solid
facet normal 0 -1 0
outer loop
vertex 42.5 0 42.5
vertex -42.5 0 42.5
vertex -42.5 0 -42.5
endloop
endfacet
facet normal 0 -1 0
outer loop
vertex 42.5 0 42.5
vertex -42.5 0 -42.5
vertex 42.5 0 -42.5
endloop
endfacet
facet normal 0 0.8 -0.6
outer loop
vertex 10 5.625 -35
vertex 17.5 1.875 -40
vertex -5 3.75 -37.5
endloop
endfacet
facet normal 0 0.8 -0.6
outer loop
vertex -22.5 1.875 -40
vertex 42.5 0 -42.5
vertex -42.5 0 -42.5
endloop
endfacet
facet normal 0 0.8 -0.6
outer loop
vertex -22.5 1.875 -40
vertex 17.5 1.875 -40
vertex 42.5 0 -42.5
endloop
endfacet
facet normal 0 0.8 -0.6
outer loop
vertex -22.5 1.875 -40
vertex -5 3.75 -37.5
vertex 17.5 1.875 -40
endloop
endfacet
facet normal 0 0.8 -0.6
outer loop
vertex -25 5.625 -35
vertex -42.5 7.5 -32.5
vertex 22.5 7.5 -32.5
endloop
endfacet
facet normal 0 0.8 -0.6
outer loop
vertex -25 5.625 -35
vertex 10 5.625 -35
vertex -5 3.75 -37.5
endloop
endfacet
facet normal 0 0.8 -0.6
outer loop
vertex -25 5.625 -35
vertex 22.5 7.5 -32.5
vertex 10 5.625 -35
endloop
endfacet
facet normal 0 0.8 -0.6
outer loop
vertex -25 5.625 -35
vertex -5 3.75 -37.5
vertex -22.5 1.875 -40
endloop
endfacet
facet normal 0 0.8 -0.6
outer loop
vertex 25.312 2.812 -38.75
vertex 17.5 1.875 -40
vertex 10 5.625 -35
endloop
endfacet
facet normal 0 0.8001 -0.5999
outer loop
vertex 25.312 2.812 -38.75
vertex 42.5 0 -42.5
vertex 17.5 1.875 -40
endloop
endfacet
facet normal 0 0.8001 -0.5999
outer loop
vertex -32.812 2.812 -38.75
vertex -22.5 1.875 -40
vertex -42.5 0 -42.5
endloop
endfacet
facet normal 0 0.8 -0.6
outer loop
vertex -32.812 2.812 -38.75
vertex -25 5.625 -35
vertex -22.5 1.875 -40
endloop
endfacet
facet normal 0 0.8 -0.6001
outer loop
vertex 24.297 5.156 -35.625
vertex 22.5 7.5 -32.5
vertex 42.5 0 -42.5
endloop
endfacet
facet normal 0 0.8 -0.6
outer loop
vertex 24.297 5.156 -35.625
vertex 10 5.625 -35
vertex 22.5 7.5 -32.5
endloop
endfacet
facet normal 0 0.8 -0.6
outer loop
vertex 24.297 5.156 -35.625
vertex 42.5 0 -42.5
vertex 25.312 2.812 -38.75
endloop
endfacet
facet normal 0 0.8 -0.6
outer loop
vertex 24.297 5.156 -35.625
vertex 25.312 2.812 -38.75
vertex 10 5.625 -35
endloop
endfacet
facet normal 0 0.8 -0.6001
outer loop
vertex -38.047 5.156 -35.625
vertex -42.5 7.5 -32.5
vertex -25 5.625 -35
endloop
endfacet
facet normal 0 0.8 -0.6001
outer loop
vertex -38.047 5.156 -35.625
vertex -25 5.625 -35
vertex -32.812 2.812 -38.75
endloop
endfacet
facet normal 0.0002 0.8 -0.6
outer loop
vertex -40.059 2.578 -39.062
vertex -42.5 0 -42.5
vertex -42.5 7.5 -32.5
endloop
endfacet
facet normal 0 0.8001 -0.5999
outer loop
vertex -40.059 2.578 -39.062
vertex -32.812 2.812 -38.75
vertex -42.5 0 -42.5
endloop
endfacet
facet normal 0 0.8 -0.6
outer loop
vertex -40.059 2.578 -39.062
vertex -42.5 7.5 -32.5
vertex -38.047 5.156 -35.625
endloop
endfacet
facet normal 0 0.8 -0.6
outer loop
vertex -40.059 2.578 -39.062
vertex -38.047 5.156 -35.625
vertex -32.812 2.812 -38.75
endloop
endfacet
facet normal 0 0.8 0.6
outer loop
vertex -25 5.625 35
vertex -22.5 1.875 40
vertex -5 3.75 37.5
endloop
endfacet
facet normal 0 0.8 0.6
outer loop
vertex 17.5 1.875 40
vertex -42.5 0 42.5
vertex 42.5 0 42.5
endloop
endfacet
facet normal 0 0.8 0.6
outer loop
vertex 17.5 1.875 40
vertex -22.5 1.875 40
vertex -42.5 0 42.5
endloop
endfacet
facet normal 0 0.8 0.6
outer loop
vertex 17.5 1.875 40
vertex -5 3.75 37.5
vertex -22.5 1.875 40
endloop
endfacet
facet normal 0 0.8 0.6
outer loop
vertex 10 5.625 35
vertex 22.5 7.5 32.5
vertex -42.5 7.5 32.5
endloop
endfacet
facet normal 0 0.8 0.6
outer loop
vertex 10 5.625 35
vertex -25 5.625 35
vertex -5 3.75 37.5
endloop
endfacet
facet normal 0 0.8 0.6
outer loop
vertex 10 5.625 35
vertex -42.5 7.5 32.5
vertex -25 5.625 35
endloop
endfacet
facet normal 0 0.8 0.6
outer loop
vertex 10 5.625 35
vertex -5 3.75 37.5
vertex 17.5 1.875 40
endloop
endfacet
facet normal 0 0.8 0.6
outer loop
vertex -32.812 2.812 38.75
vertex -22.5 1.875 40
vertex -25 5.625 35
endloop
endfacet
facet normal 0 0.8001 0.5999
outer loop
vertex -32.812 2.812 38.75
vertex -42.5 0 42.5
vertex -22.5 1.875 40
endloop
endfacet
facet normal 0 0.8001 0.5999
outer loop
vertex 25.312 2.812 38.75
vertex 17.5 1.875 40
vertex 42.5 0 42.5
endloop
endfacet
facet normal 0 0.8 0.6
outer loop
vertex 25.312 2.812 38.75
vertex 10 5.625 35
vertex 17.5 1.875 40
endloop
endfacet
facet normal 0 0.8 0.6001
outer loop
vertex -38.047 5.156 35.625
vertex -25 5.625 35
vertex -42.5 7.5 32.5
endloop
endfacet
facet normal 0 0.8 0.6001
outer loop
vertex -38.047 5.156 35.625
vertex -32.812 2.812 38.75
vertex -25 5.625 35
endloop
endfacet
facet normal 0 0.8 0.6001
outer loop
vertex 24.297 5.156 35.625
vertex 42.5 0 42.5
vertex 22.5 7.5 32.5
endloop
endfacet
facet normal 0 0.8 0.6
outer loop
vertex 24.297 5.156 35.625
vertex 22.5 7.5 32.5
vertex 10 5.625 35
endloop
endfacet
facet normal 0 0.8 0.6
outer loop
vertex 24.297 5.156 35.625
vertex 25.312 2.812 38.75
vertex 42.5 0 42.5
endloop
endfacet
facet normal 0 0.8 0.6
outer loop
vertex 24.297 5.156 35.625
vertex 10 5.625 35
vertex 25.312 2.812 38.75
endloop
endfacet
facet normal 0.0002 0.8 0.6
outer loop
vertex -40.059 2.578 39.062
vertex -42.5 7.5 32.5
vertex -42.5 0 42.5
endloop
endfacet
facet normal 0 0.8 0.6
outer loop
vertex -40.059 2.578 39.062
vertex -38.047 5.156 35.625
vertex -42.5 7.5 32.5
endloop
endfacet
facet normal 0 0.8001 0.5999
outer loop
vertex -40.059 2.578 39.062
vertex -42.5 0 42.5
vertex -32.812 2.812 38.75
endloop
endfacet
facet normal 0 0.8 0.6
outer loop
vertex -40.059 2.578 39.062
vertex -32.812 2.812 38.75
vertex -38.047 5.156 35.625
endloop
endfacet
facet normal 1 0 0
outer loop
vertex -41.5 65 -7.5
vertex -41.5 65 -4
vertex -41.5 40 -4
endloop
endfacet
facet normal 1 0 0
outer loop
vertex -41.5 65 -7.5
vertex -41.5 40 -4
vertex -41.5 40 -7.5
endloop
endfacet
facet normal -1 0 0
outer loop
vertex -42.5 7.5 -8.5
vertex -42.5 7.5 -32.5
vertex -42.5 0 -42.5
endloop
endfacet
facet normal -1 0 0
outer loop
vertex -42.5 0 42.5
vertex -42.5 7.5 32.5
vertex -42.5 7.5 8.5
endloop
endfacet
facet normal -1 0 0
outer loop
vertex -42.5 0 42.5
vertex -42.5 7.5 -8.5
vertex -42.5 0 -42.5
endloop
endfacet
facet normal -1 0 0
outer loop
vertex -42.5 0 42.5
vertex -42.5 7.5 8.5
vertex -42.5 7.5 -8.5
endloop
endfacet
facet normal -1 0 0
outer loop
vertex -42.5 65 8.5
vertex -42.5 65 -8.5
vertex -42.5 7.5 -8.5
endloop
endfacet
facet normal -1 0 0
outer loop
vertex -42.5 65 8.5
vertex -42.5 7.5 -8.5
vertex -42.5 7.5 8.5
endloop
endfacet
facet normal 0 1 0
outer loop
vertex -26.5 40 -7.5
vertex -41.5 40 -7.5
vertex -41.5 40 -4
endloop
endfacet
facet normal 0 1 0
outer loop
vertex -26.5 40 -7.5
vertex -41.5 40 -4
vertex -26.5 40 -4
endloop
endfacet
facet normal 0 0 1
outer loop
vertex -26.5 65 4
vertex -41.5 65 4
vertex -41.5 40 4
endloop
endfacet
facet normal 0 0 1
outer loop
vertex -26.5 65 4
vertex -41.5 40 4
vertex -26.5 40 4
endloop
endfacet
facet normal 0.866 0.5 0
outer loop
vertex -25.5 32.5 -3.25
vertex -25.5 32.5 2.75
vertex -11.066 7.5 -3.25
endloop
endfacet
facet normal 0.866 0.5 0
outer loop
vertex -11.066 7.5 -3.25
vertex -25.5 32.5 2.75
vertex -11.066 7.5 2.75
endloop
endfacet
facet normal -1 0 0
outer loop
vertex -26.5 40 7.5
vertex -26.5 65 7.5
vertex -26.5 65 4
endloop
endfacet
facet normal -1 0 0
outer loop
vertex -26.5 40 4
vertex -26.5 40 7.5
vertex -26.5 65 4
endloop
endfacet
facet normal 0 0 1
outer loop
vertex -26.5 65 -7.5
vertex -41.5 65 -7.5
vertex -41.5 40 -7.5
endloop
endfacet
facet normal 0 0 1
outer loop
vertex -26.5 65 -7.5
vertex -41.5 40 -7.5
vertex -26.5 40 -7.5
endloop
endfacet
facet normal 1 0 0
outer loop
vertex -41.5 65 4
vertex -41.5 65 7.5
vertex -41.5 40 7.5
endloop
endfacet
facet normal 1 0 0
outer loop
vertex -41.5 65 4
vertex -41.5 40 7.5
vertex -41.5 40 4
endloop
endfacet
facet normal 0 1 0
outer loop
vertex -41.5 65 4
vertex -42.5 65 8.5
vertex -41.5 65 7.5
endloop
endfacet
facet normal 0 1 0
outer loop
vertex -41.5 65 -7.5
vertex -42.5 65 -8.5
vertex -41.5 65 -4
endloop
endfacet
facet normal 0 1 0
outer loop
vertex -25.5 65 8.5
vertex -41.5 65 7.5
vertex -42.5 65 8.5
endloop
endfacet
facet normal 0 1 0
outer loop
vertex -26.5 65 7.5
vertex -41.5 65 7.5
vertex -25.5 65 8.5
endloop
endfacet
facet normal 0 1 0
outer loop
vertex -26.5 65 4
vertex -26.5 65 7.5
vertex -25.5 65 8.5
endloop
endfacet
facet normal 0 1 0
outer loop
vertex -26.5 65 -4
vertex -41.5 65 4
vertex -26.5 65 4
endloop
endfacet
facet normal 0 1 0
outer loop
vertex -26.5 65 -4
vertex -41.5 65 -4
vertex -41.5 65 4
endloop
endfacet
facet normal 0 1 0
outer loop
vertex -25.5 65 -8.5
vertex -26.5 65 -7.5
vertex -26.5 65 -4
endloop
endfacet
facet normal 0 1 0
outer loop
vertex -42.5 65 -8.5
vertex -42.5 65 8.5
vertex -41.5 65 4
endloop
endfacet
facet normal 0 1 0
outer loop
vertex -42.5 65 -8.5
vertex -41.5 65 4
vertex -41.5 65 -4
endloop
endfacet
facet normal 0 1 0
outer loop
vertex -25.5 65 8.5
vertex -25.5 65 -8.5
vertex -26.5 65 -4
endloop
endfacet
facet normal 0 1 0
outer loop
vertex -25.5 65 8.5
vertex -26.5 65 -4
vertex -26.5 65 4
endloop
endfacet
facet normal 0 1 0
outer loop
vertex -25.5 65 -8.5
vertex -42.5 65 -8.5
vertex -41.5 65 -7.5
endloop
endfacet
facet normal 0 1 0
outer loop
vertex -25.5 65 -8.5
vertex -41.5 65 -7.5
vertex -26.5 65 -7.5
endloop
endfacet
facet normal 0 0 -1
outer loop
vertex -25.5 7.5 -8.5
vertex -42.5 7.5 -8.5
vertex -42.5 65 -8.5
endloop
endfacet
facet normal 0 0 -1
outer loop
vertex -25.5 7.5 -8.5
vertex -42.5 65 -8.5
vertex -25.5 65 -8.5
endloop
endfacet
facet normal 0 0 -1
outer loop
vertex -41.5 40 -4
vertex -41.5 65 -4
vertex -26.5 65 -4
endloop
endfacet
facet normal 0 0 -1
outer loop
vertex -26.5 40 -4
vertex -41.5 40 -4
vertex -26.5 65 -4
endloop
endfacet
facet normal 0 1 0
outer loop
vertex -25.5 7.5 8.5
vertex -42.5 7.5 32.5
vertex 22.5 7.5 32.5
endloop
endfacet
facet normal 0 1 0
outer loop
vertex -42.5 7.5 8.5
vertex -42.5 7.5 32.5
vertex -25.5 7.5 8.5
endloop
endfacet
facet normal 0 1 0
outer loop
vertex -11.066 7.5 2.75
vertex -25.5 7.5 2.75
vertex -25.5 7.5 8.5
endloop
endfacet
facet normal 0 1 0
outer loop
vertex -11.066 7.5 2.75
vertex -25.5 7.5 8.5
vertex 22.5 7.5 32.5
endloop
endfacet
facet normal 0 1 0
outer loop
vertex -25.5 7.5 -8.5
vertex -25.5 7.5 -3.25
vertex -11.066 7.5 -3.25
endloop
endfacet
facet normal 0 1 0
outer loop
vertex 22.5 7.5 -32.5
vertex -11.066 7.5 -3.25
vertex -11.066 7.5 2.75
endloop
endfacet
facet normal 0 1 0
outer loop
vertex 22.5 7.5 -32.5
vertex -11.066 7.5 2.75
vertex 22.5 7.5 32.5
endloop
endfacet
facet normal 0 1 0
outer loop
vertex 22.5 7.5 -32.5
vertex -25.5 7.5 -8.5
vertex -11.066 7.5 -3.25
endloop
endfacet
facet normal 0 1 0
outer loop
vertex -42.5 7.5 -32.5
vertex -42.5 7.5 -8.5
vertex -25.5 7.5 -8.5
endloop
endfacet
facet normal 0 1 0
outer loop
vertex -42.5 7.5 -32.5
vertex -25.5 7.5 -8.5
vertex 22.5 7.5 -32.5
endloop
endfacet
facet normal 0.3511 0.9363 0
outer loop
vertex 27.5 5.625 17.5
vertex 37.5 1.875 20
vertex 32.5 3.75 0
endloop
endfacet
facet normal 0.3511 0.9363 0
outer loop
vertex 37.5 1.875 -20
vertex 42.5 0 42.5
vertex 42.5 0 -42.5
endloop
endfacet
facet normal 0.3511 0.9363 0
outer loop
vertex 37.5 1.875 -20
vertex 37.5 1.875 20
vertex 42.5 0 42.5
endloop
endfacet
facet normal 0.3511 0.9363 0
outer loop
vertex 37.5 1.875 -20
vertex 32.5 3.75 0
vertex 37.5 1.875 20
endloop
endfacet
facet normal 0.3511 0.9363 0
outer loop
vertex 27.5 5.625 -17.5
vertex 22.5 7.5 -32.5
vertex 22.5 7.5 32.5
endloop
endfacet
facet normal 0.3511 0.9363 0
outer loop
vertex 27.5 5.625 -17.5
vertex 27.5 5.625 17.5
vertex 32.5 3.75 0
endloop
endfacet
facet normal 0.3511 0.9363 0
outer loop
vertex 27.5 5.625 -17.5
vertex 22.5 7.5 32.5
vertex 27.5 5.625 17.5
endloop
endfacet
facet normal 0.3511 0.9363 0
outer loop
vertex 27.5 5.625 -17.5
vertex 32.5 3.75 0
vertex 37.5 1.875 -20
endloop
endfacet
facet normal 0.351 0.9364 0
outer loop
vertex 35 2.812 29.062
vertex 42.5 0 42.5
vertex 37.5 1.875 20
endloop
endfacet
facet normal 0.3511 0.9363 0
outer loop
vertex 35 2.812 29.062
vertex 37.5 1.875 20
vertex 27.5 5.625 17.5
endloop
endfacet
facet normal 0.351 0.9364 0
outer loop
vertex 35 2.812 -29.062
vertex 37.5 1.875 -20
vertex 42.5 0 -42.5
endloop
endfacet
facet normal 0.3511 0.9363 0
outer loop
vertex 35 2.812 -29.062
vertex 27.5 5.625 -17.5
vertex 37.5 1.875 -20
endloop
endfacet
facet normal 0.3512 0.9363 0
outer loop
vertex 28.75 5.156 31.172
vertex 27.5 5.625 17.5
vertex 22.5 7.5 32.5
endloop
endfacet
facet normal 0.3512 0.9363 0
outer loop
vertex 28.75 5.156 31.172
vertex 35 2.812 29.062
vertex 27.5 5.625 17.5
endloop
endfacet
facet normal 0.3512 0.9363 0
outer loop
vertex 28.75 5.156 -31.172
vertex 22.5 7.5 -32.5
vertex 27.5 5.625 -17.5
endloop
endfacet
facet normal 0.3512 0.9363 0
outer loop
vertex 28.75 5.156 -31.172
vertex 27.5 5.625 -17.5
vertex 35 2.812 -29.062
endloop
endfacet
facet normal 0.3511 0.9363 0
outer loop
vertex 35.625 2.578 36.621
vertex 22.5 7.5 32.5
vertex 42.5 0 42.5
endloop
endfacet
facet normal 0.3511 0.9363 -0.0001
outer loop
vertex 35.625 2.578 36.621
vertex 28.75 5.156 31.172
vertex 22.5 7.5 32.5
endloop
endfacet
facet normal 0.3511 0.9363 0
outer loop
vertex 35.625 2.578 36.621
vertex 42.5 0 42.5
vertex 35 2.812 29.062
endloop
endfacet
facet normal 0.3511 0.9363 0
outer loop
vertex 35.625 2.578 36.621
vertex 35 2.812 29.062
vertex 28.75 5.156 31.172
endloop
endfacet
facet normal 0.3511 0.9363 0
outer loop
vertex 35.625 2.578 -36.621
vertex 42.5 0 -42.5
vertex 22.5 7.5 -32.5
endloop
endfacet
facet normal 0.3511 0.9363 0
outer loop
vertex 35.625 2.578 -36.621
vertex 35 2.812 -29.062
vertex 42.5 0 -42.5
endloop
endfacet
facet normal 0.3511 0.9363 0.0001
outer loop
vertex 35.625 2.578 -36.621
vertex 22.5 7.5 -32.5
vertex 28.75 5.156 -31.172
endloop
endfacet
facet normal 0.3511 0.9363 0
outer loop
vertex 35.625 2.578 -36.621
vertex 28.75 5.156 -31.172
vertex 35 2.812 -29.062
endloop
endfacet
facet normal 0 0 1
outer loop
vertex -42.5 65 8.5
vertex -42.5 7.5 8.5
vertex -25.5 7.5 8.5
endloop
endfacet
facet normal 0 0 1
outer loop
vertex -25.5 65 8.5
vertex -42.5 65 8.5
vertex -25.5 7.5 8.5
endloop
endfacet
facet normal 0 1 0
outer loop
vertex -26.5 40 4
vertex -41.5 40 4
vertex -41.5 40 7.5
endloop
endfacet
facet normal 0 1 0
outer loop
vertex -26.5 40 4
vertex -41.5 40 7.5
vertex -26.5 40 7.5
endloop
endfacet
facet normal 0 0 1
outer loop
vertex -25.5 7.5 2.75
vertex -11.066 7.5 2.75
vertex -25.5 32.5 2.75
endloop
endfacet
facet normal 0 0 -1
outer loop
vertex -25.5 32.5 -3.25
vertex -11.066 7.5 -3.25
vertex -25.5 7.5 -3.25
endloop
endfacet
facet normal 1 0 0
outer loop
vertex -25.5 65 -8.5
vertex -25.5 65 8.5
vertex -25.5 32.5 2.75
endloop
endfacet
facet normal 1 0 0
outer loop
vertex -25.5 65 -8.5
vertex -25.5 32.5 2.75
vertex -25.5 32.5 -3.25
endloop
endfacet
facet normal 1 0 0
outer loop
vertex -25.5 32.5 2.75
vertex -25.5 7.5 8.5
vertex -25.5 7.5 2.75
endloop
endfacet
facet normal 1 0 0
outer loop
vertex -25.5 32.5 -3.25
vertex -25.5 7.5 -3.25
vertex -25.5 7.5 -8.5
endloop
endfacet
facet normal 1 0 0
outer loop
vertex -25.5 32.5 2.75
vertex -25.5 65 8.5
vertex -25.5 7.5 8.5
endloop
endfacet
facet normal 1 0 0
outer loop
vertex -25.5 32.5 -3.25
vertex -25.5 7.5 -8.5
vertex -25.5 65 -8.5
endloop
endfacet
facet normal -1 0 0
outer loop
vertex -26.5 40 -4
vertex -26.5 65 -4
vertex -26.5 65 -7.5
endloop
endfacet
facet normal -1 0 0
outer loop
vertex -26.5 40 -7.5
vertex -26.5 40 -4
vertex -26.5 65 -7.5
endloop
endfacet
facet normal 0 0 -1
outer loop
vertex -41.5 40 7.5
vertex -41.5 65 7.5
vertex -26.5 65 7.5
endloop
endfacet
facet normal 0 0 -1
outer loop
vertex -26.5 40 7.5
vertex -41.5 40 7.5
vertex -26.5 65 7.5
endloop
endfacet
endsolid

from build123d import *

# Parameters (mm, degrees)
SKETCH2_W           = 85
SKETCH2_H           = 85
SKETCH3_W           = 65
SKETCH3_H           = 65
SKETCH10_W          = 17
SKETCH10_H          = 17
BOSS_EXTRUDE5_DEPTH = 57.5
SKETCH11_W          = 15
SKETCH11_H          = 3.5
CUT_EXTRUDE1_DEPTH  = 25
BOSS_EXTRUDE6_START = -5.75
BOSS_EXTRUDE6_DEPTH = 6


with BuildPart() as part:
    # Sketch2 → Loft1 section 0
    with BuildSketch(Plane(origin=(0, 0, 0), x_dir=(1, 0, 0), z_dir=(0, 1, 0))):
        Rectangle(SKETCH2_W, SKETCH2_H)
    # Sketch3 → Loft1 section 1
    with BuildSketch(Plane(origin=(0, 7.5, 0), x_dir=(1, 0, 0), z_dir=(0, 1, 0))):
        with Locations((-10, 0)):
            Rectangle(SKETCH3_W, SKETCH3_H)
    loft()

    # Sketch10 → Boss-Extrude5 (add)
    with BuildSketch(Plane(origin=(0, 7.5, 0), x_dir=(1, 0, 0), z_dir=(0, 1, 0))):
        with Locations((-34, 0)):
            Rectangle(SKETCH10_W, SKETCH10_H)
    extrude(amount=BOSS_EXTRUDE5_DEPTH)

    # Sketch11 → Cut-Extrude1 (cut)
    with BuildSketch(Plane(origin=(0, 65, 0), x_dir=(1, 0, 0), z_dir=(0, 1, 0))):
        with Locations((-34, 5.75)):
            Rectangle(SKETCH11_W, SKETCH11_H)
        with Locations((-34, -5.75)):
            Rectangle(SKETCH11_W, SKETCH11_H)
    extrude(amount=-CUT_EXTRUDE1_DEPTH, mode=Mode.SUBTRACT)

    # Sketch14 → Boss-Extrude6 (add)
    with BuildSketch(Plane.XY.offset(8.5).offset(BOSS_EXTRUDE6_START)):
        Polygon((-25.5, 32.5), (-11.06624327, 7.5), (-25.5, 7.5), align=None)
    extrude(amount=-BOSS_EXTRUDE6_DEPTH)


solid = part.part
